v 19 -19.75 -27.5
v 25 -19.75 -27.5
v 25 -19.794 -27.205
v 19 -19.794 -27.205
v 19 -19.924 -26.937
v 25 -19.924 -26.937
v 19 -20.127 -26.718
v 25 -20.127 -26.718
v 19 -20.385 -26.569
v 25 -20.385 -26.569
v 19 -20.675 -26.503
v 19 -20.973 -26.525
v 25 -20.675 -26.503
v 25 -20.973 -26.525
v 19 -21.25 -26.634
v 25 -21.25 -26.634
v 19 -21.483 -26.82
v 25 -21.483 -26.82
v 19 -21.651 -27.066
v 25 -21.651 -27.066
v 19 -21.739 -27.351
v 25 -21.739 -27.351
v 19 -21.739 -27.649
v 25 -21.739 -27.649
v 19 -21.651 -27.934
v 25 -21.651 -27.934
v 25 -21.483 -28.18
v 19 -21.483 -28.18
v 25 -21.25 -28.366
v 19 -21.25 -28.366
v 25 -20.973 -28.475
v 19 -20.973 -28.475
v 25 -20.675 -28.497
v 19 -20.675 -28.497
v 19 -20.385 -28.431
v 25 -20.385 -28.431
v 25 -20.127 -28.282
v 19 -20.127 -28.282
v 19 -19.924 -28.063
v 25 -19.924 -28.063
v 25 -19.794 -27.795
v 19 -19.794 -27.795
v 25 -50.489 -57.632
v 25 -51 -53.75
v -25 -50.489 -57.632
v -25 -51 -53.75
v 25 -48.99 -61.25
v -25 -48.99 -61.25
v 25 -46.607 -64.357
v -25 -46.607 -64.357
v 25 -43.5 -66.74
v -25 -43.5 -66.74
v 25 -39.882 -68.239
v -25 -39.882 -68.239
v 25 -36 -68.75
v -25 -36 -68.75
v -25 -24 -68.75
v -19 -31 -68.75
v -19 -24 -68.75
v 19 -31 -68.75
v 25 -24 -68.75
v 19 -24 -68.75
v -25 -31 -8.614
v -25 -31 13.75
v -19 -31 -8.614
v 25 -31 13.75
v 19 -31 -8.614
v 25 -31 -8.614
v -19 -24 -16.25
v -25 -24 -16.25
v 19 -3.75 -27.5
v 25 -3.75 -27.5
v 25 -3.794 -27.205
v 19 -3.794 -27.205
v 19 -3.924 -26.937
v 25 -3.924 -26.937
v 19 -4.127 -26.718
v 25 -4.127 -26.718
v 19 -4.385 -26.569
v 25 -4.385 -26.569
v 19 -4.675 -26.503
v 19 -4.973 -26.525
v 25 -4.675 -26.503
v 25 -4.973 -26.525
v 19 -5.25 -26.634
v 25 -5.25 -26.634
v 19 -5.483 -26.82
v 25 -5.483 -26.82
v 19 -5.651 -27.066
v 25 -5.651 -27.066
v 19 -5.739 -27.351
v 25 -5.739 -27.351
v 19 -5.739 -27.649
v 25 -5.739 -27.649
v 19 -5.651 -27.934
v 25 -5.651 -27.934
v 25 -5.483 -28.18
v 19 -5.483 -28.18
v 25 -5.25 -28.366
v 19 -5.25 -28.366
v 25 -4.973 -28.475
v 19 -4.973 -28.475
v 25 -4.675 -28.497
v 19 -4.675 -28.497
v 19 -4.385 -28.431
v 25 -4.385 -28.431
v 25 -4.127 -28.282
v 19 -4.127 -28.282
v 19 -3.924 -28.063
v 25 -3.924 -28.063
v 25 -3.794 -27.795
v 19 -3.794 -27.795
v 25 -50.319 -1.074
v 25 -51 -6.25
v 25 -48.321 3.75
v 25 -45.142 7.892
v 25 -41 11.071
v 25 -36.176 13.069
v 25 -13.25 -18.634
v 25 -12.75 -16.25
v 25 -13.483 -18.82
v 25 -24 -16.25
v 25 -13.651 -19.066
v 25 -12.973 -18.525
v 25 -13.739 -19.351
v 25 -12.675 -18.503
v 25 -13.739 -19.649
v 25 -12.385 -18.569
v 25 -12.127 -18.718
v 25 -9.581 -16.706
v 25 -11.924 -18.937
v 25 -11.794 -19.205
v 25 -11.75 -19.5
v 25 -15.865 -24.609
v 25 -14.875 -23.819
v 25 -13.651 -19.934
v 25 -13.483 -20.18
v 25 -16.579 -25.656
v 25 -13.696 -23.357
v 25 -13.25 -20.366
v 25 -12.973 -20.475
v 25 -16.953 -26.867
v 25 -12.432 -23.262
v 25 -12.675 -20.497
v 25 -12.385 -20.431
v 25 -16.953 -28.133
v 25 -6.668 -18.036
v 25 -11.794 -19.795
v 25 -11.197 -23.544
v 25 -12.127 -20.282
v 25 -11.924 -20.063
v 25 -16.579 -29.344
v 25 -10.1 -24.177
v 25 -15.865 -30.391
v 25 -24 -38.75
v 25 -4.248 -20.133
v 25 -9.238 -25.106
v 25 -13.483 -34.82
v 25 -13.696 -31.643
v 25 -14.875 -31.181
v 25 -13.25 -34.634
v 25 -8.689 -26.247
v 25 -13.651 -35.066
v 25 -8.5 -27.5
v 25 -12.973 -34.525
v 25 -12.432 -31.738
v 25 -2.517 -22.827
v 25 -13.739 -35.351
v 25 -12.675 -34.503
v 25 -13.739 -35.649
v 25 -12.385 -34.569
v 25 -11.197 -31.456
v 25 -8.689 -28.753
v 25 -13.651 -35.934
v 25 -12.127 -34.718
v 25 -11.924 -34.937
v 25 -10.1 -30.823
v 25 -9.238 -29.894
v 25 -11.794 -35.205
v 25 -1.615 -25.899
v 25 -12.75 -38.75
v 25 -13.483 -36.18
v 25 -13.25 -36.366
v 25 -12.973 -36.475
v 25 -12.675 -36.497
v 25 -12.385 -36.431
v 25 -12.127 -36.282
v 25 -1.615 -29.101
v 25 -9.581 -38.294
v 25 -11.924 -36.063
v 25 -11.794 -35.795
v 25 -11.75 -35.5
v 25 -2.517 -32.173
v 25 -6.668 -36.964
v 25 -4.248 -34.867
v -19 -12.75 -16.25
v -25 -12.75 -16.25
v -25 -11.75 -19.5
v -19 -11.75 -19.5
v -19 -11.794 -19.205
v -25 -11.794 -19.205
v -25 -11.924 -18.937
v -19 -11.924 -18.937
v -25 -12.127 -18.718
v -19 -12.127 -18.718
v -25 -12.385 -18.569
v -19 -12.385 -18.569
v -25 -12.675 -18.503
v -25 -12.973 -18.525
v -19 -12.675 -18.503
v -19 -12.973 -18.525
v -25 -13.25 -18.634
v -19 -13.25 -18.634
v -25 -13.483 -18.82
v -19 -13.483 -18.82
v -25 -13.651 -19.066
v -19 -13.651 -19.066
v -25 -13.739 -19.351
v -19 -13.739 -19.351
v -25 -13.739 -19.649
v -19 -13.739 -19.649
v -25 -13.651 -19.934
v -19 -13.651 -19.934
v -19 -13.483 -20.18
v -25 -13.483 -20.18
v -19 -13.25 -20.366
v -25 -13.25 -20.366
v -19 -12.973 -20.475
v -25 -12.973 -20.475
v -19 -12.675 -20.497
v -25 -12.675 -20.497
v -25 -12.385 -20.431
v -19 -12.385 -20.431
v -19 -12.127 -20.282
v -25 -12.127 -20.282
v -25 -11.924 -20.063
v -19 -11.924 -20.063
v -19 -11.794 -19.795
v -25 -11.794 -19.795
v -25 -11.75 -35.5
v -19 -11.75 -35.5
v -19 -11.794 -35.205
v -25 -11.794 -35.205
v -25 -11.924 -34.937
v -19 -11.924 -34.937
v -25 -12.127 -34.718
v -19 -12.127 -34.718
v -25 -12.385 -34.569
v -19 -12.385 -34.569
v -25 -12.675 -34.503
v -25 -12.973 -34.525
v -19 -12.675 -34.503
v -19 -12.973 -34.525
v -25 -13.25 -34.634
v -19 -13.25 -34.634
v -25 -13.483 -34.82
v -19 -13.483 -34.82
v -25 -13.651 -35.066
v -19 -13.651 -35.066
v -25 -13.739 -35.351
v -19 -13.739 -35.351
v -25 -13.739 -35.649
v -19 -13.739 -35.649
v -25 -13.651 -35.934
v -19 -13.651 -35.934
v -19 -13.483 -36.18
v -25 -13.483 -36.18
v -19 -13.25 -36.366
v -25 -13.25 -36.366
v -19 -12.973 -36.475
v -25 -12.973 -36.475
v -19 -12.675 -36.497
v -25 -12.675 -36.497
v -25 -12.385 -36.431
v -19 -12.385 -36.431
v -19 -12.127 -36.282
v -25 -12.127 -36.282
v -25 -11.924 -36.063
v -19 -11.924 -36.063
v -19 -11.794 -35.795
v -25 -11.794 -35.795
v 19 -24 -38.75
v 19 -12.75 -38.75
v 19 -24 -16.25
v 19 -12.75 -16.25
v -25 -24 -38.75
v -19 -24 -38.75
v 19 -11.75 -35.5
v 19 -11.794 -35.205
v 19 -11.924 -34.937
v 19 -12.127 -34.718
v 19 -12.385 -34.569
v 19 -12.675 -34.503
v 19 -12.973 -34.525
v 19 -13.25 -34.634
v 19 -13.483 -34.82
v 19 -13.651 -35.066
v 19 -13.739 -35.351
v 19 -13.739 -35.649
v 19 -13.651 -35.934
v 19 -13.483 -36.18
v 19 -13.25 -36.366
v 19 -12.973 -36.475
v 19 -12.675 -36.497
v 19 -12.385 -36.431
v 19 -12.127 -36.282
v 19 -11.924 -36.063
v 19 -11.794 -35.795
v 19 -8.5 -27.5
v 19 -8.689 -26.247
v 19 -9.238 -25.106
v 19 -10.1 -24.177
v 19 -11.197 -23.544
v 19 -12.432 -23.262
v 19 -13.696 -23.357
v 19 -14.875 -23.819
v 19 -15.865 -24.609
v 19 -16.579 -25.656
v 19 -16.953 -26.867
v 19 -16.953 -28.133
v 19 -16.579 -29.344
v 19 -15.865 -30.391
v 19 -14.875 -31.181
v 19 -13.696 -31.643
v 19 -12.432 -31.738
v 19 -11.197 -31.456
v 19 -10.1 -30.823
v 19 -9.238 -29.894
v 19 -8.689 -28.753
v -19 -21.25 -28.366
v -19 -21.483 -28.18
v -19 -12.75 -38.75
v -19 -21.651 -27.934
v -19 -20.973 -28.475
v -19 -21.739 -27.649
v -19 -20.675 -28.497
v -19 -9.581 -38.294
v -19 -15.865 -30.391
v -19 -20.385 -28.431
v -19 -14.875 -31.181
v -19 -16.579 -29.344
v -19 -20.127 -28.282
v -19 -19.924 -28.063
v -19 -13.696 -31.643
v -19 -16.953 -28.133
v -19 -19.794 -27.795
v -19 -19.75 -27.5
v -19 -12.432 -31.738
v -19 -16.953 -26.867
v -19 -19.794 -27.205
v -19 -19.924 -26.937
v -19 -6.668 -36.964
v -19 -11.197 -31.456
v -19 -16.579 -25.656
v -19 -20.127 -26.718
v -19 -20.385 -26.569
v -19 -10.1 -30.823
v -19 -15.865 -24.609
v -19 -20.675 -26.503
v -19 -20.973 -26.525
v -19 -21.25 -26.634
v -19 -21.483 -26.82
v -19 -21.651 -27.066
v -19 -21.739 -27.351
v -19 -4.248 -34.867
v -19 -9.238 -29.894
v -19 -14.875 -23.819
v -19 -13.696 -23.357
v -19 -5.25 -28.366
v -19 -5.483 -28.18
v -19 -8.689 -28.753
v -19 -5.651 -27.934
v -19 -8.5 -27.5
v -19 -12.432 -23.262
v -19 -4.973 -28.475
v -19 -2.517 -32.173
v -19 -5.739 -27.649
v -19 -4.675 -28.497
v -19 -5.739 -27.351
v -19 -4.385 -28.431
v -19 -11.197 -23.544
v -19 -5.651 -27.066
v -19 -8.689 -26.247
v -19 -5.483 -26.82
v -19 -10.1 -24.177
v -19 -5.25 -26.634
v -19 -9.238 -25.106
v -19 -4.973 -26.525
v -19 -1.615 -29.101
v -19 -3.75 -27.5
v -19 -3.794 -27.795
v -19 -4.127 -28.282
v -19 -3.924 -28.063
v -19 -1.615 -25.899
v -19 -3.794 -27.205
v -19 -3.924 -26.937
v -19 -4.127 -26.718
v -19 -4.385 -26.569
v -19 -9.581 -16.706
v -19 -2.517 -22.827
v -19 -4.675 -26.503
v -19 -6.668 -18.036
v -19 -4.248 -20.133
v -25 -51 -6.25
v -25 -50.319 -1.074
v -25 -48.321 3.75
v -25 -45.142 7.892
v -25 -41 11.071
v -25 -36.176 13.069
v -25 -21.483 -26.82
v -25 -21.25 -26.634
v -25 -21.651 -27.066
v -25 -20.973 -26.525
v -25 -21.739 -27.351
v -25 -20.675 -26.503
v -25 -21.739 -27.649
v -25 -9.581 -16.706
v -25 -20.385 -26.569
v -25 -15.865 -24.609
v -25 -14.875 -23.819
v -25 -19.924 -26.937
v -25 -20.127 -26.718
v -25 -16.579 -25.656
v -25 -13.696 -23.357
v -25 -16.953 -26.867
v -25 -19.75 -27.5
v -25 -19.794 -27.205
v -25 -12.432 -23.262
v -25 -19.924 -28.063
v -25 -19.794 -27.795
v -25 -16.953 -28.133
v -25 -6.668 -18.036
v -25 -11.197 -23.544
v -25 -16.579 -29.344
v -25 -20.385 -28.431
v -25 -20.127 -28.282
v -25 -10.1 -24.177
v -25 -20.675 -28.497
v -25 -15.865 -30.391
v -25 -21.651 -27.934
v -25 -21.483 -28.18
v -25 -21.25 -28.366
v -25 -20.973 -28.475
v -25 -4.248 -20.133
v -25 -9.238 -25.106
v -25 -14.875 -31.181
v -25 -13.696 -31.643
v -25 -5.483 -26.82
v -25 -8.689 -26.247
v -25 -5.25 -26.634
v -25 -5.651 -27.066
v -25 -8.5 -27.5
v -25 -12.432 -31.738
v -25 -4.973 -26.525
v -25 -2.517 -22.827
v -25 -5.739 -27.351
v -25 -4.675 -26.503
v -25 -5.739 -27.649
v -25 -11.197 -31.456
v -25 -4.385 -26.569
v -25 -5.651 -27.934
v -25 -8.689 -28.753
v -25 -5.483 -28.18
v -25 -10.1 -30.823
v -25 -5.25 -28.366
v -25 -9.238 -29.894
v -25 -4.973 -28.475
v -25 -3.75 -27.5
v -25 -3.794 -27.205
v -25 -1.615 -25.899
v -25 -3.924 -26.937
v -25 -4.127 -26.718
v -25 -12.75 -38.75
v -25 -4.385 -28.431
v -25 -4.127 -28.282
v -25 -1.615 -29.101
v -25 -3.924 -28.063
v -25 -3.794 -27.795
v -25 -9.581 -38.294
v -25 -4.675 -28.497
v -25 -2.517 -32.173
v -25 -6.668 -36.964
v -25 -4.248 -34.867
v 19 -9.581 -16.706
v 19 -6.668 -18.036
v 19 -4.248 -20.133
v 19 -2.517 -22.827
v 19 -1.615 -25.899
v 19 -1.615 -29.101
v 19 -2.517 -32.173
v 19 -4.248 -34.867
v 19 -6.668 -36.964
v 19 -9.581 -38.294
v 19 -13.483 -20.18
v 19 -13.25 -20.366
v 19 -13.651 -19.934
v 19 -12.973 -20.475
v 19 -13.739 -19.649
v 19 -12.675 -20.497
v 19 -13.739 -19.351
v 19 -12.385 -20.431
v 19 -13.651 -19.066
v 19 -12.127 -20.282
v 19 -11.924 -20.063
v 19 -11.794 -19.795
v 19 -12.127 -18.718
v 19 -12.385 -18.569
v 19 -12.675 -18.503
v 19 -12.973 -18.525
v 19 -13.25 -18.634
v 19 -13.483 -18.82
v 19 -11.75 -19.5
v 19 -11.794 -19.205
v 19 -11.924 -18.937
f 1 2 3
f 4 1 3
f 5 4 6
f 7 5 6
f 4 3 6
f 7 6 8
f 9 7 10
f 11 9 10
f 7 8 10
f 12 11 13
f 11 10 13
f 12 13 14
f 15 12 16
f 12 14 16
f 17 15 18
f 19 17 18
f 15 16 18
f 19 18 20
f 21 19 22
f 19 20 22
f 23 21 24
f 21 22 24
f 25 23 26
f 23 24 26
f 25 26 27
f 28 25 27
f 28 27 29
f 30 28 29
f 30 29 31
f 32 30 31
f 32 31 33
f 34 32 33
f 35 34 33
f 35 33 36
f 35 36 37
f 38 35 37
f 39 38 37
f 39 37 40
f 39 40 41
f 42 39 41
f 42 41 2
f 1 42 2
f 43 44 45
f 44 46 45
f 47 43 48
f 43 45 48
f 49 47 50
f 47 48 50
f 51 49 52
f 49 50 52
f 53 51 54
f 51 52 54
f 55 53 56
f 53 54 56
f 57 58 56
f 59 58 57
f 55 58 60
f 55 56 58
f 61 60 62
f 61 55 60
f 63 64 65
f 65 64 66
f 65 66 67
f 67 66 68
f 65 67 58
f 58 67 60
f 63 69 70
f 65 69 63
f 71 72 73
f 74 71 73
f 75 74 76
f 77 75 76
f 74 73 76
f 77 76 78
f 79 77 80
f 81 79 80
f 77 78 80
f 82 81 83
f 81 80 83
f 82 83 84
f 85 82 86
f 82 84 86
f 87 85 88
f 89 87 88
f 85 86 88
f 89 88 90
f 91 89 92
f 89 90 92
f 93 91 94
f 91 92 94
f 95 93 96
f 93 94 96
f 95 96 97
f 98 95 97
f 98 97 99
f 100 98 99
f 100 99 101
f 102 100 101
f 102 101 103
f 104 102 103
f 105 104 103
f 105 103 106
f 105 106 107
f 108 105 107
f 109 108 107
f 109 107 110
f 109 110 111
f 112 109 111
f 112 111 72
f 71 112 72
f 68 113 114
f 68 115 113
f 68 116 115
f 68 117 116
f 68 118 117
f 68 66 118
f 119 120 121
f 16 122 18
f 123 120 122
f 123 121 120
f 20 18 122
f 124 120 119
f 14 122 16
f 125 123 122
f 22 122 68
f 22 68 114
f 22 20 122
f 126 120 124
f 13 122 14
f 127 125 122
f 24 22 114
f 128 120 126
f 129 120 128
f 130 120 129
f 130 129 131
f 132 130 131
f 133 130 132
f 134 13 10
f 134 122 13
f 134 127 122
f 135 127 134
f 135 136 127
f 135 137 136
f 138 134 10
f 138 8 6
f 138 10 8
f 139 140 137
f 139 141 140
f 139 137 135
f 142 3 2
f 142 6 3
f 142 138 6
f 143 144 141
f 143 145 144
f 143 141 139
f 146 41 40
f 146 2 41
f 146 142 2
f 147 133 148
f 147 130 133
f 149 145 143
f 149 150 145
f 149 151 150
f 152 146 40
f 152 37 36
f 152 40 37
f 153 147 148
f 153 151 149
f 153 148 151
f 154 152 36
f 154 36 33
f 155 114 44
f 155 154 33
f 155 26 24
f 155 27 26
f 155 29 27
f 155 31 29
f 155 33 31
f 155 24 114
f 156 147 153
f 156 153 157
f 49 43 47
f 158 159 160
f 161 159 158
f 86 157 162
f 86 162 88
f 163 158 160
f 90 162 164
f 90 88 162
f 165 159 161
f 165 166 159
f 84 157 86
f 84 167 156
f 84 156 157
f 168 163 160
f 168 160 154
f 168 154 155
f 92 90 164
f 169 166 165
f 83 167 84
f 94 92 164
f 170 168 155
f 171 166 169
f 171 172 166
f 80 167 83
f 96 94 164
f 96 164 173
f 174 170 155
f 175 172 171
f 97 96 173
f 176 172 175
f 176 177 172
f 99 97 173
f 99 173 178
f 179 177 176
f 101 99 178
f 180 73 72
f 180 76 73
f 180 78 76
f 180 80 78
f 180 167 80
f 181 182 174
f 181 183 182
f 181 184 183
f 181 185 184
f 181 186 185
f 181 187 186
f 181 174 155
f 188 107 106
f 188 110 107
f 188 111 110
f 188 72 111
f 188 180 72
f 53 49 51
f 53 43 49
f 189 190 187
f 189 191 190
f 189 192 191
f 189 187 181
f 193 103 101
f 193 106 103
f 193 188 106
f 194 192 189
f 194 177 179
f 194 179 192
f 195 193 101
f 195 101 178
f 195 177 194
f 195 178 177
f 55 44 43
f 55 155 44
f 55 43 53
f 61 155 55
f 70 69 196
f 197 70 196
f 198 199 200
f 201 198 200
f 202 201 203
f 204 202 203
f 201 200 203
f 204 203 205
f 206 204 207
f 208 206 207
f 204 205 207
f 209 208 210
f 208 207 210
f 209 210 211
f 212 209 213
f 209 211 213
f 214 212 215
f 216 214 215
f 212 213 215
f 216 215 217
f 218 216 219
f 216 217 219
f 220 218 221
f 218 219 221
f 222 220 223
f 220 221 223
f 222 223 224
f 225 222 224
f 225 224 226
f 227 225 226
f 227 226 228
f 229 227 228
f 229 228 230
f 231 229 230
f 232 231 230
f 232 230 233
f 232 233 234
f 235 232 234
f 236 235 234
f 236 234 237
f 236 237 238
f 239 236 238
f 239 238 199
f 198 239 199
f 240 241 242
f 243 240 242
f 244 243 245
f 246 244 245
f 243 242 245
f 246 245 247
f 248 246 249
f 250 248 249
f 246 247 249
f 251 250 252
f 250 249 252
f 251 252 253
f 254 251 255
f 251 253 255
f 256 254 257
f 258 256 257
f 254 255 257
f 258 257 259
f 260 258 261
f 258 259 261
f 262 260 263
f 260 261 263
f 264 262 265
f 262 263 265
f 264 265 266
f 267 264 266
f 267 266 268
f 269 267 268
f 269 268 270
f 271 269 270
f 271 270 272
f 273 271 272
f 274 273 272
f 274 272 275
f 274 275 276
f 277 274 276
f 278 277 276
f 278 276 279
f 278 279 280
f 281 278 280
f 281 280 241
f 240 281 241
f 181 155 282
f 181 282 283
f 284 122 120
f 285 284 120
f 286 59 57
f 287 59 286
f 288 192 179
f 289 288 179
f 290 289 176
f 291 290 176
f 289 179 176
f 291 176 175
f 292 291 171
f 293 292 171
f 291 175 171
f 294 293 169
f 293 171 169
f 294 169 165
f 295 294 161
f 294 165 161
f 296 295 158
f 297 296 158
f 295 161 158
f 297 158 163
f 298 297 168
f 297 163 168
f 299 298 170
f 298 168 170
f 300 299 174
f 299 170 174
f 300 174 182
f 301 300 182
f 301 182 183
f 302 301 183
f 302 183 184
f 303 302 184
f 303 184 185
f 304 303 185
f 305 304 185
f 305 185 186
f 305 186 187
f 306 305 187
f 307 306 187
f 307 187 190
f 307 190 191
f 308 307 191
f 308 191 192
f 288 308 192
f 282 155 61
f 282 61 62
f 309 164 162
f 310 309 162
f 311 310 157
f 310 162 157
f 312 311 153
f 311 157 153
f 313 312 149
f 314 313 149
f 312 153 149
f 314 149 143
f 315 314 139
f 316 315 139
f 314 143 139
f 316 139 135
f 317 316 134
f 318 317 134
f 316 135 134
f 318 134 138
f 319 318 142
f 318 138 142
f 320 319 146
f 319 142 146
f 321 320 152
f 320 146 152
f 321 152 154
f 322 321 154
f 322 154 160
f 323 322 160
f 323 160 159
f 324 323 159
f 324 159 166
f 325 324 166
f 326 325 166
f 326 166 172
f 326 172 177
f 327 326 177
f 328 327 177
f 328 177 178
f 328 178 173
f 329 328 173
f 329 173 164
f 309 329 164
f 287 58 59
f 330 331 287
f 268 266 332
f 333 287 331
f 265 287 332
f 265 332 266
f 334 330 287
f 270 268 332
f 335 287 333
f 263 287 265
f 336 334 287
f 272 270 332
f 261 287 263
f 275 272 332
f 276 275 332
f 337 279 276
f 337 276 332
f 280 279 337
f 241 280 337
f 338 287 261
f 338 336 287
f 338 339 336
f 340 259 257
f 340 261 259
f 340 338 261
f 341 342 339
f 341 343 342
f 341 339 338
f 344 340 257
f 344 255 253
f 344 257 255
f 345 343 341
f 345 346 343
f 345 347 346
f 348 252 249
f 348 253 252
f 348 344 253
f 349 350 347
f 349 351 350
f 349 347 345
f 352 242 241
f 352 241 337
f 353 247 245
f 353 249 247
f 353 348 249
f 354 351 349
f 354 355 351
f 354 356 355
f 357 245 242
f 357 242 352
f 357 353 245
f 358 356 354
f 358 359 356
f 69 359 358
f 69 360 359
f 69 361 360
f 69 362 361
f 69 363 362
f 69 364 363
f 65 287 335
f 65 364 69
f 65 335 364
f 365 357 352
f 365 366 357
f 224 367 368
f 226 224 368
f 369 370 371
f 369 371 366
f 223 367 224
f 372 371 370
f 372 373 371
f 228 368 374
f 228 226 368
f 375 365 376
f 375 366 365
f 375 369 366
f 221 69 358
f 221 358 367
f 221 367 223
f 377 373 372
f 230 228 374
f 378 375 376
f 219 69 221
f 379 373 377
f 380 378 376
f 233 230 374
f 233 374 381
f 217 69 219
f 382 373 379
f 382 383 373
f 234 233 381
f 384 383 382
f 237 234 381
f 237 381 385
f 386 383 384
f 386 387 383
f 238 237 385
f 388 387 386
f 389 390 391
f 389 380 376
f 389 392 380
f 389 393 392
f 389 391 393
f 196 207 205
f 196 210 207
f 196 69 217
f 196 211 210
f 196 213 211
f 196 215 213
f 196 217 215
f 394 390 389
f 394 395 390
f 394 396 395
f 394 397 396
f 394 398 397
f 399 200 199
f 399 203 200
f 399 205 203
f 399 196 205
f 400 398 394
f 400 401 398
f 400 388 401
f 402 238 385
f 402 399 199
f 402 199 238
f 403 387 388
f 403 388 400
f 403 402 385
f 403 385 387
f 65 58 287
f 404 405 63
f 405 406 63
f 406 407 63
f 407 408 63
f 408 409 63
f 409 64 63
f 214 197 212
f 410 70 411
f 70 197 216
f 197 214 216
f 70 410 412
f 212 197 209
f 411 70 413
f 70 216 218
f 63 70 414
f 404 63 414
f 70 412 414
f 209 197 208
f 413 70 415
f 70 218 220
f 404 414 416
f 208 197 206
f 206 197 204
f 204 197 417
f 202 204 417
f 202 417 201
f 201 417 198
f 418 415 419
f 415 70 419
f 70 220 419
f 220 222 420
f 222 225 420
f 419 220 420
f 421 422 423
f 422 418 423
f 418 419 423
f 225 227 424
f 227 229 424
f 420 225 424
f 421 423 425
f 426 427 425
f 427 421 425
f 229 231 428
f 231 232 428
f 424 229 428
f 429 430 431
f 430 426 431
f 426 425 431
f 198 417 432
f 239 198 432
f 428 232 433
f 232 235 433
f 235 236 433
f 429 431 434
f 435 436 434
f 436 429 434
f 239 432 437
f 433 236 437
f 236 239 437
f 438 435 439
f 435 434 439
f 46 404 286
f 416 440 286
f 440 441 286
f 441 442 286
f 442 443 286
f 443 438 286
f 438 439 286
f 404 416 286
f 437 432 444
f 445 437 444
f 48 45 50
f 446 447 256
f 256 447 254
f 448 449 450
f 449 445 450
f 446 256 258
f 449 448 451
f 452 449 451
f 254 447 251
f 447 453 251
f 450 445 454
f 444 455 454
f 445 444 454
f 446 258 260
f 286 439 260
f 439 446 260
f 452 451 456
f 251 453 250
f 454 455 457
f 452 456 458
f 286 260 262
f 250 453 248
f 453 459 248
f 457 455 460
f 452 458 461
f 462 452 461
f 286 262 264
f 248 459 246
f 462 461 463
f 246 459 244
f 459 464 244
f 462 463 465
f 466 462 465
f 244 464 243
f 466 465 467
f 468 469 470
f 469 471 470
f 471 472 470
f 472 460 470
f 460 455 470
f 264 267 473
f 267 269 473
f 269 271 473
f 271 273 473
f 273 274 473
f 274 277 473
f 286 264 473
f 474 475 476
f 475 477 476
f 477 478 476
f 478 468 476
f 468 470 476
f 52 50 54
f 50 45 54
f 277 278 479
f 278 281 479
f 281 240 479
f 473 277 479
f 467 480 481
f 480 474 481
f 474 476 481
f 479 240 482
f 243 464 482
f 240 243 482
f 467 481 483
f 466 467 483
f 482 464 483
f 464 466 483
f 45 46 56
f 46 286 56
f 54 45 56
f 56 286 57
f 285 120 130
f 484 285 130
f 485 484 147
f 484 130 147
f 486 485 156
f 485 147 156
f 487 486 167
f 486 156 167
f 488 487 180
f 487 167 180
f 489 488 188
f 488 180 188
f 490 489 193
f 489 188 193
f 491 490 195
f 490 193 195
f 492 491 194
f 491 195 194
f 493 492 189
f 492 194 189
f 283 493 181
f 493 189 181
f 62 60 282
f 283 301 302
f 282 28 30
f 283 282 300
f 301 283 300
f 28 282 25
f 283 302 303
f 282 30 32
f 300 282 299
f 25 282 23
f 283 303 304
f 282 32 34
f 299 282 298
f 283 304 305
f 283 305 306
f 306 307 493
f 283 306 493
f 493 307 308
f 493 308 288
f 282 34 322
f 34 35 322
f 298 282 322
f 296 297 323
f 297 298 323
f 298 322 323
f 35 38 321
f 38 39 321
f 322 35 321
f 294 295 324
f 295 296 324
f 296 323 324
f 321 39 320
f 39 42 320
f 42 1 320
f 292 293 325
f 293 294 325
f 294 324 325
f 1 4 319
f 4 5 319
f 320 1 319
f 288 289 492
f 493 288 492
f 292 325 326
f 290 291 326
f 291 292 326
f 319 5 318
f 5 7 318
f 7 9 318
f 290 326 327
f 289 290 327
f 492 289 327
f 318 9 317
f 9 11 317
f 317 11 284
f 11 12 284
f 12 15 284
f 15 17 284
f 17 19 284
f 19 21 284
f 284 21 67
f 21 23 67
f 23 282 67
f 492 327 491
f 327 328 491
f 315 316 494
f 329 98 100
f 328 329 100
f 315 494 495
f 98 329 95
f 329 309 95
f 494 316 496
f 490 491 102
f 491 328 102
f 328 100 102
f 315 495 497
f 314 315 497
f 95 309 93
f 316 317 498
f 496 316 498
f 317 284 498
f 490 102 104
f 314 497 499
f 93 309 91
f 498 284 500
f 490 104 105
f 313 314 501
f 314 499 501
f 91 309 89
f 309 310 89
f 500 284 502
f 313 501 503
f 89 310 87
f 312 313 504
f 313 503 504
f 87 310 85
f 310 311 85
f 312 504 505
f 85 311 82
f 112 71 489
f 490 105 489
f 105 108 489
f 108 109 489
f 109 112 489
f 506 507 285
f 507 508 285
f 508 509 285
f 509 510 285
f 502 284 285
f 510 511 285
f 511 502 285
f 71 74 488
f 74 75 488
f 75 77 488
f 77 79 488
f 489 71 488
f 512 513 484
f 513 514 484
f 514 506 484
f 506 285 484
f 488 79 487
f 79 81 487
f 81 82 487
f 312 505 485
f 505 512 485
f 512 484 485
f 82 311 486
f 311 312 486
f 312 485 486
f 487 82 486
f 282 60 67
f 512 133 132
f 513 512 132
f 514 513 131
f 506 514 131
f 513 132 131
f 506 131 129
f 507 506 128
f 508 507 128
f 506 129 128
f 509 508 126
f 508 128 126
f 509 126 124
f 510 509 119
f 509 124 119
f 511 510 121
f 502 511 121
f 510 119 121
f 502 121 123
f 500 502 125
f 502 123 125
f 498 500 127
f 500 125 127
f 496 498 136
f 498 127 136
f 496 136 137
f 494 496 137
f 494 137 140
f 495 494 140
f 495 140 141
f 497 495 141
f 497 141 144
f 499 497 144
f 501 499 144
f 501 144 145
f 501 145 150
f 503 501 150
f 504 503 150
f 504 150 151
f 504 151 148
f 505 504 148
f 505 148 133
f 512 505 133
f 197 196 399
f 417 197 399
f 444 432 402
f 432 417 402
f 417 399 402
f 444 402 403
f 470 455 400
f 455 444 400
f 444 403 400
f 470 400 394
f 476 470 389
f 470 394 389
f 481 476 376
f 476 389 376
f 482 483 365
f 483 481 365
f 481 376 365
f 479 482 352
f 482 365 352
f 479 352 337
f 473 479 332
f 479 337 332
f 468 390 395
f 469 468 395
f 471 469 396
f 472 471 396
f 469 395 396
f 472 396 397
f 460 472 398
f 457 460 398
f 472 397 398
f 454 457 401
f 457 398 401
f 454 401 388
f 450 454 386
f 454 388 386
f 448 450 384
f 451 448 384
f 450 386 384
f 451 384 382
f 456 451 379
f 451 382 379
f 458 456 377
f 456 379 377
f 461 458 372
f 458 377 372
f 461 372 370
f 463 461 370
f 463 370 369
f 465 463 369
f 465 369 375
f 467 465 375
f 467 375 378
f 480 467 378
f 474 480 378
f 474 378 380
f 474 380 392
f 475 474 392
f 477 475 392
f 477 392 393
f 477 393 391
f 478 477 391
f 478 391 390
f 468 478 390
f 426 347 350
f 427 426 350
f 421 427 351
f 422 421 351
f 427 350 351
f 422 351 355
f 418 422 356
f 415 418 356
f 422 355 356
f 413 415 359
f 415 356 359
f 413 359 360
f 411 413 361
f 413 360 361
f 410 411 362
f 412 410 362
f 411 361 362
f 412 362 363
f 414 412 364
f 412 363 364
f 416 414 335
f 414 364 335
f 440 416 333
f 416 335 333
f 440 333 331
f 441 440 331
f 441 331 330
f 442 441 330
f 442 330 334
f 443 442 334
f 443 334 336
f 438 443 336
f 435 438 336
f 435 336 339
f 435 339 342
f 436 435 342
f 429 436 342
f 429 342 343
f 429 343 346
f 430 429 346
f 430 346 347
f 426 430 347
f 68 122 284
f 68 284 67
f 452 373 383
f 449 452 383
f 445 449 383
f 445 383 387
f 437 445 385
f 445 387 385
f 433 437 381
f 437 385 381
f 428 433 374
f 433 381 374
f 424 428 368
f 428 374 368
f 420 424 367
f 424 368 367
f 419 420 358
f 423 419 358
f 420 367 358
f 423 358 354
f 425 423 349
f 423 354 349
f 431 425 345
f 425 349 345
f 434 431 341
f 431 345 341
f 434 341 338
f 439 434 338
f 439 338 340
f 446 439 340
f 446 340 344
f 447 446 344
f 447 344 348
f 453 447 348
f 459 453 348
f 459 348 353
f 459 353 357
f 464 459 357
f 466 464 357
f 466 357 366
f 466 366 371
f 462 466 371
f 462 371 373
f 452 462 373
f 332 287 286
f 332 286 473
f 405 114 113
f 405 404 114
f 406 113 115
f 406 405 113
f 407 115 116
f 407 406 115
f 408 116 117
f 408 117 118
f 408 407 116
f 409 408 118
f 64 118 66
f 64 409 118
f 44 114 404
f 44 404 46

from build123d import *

# Parameters (mm, degrees)
SKETCH1_W            = 50
SKETCH1_H            = 170
BOSS_EXTRUDE1_DEPTH  = 55
SKETCH2_W            = 34
SKETCH2_H            = 27
CUT_EXTRUDE1_DEPTH   = 181.416185527
SKETCH3_W            = 10
SKETCH3_H            = 24
SKETCH3_R            = 4.25
SKETCH3_R_2          = 1
CUT_EXTRUDE2_DEPTH   = 186.539753153
SKETCH4_W            = 2
SKETCH4_H            = 24
CUT_EXTRUDE3_DEPTH   = 178.623196683
SKETCH5_W            = 6.25
SKETCH5_H            = 11.25
CUT_EXTRUDE4_DEPTH   = 186.539753153
SKETCH6_W            = 38
SKETCH6_H            = 10
CUT_EXTRUDE5_DEPTH   = 181.416185527
SKETCH8_W            = 13.25
SKETCH8_H            = 2.25
CUT_EXTRUDE7_DEPTH   = 186.539753153
SKETCH9_W            = 34
SKETCH9_H            = 35.25
CUT_EXTRUDE8_DEPTH   = 179.297679458
SKETCH11_W           = 13.25
SKETCH11_H           = 20.25
CUT_EXTRUDE9_DEPTH   = 184.480414486
SKETCH12_W           = 28.5
SKETCH12_H           = 15
BOSS_EXTRUDE2_DEPTH  = 8
SKETCH14_W           = 34
SKETCH14_H           = 15
SKETCH14_H_2         = 10.25
BOSS_EXTRUDE3_DEPTH  = 13.25
SKETCH16_R           = 4.5
SKETCH16_R_2         = 2.5
CUT_EXTRUDE13_DEPTH  = 8
SKETCH17_R           = 4.5
SKETCH17_W           = 55
SKETCH17_H           = 10.25
CUT_EXTRUDE15_DEPTH  = 175.384811552
SKETCH18_W           = 71.25
SKETCH18_H           = 27.5
SKETCH18_W_2         = 13.75
SKETCH18_W_3         = 16.25
BOSS_EXTRUDE4_DEPTH  = 50
SKETCH19_W           = 38
SKETCH19_H           = 7
CUT_EXTRUDE16_DEPTH  = 152.25227271
SKETCH20_W           = 57.5
SKETCH20_H           = 27.5
CUT_EXTRUDE17_DEPTH  = 102.137591923
CUT_EXTRUDE18_DEPTH  = 100.39221549
SKETCH22_W           = 82.5
SKETCH22_H           = 2.5
BOSS_EXTRUDE5_DEPTH  = 50
SKETCH24_W           = 22
SKETCH24_H           = 17
CUT_EXTRUDE19_DEPTH  = 101.710289941
SKETCH25_W           = 38
SKETCH25_H           = 38.136363636
CUT_EXTRUDE20_DEPTH  = 10
SKETCH26_W           = 82.5
SKETCH26_H           = 2.5
CUT_EXTRUDE21_DEPTH  = 101.710289941
SKETCH27_W           = 38
SKETCH27_H           = 5
BOSS_EXTRUDE6_DEPTH  = 60.14
SKETCH29_W           = 38
SKETCH29_H           = 5
BOSS_EXTRUDE8_DEPTH  = 60.14
SKETCH30_W           = 6
SKETCH30_H           = 17
BOSS_EXTRUDE9_DEPTH  = 22.14
SKETCH31_W           = 22.363636364
SKETCH31_H           = 20.5
BOSS_EXTRUDE10_DEPTH = 50
SKETCH32_W           = 82.5
SKETCH32_H           = 0.5
SKETCH32_W_2         = 0.14
SKETCH32_H_2         = 17
CUT_EXTRUDE22_DEPTH  = 100.489105434
FILLET1_R            = 15
FILLET2_R            = 20


with BuildPart() as part:
    # Sketch1 → Boss-Extrude1 (new body)
    with BuildSketch(Plane.XY):
        with Locations((0, -85)):
            Rectangle(SKETCH1_W, SKETCH1_H)
    extrude(amount=-BOSS_EXTRUDE1_DEPTH)

    # Sketch2 → Cut-Extrude1 (cut, through all)
    with BuildSketch(Plane.XY):
        with Locations((0, -13.5)):
            Rectangle(SKETCH2_W, SKETCH2_H)
    extrude(amount=-CUT_EXTRUDE1_DEPTH, mode=Mode.SUBTRACT)

    # Sketch3 → Cut-Extrude2 (cut, through all)
    with BuildSketch(Plane(origin=(25, 0, 0), x_dir=(0, 0, -1), z_dir=(1, 0, 0))):
        with Locations((50, -12)):
            Rectangle(SKETCH3_W, SKETCH3_H)
        with Locations((5, -12)):
            Rectangle(SKETCH3_W, SKETCH3_H)
        with Locations(Location((27.5, -12.75, 0), (0, 0, 90))):
            Circle(SKETCH3_R)
        with Locations(Location((35.5, -12.75, 0), (0, 0, 90))):
            Circle(SKETCH3_R_2)
        with Locations(Location((27.5, -4.75, 0), (0, 0, 90))):
            Circle(SKETCH3_R_2)
        with Locations(Location((27.5, -20.75, 0), (0, 0, 90))):
            Circle(SKETCH3_R_2)
        with Locations(Location((19.5, -12.75, 0), (0, 0, 90))):
            Circle(SKETCH3_R_2)
    extrude(amount=-CUT_EXTRUDE2_DEPTH, mode=Mode.SUBTRACT)

    # Sketch4 → Cut-Extrude3 (cut, through all)
    with BuildSketch(Plane.XY.offset(-10)):
        with Locations((-18, -12)):
            Rectangle(SKETCH4_W, SKETCH4_H)
        with Locations((18, -12)):
            Rectangle(SKETCH4_W, SKETCH4_H)
    extrude(amount=-CUT_EXTRUDE3_DEPTH, mode=Mode.SUBTRACT)

    # Sketch5 → Cut-Extrude4 (cut, through all)
    with BuildSketch(Plane(origin=(25, 0, 0), x_dir=(0, 0, -1), z_dir=(1, 0, 0))):
        with BuildLine():
            Line((45, 0), (10, 0))
            Line((10, 0), (10, -12.75))
            Line((10, -12.75), (16.25, -12.75))
            ThreePointArc((16.25, -12.75), (27.5, -1.5), (38.75, -12.75))
            Line((38.75, -12.75), (45, -12.75))
            Line((45, -12.75), (45, 0))
        make_face()
        with Locations((13.125, -18.375)):
            Rectangle(SKETCH5_W, SKETCH5_H)
        with Locations((41.875, -18.375)):
            Rectangle(SKETCH5_W, SKETCH5_H)
    extrude(amount=-CUT_EXTRUDE4_DEPTH, mode=Mode.SUBTRACT)

    # Sketch6 → Cut-Extrude5 (cut, through all)
    with BuildSketch(Plane.XY):
        with Locations((0, -29)):
            Rectangle(SKETCH6_W, SKETCH6_H)
    extrude(amount=-CUT_EXTRUDE5_DEPTH, mode=Mode.SUBTRACT)

    # Sketch8 → Cut-Extrude7 (cut, through all)
    with BuildSketch(Plane(origin=(25, 0, 0), x_dir=(0, 0, -1), z_dir=(1, 0, 0))):
        with BuildLine():
            Line((27.5, -157.5), (27.5, -132.5))
            Line((27.5, -132.5), (13.25, -132.5))
            Line((13.25, -132.5), (13.25, -167.75))
            Line((13.25, -167.75), (17.25, -167.75))
            ThreePointArc((17.25, -167.75), (20.252155493, -160.502155493), (27.5, -157.5))
        make_face()
        with BuildLine():
            Line((41.75, -167.75), (41.75, -132.5))
            Line((41.75, -132.5), (27.5, -132.5))
            Line((27.5, -132.5), (27.5, -157.5))
            ThreePointArc((27.5, -157.5), (34.747844507, -160.502155493), (37.75, -167.75))
            Line((37.75, -167.75), (41.75, -167.75))
        make_face()
        with Locations((48.375, -168.875)):
            Rectangle(SKETCH8_W, SKETCH8_H)
        with Locations((6.625, -168.875)):
            Rectangle(SKETCH8_W, SKETCH8_H)
        with BuildLine():
            Line((17.25, -167.75), (13.25, -167.75))
            Line((13.25, -167.75), (13.25, -170))
            Line((13.25, -170), (17.5, -170))
            ThreePointArc((17.5, -170), (17.31269172, -168.881923142), (17.25, -167.75))
        make_face()
        with BuildLine():
            Line((41.75, -170), (41.75, -167.75))
            Line((41.75, -167.75), (37.75, -167.75))
            ThreePointArc((37.75, -167.75), (37.68730828, -168.881923142), (37.5, -170))
            Line((37.5, -170), (41.75, -170))
        make_face()
        with BuildLine():
            Line((27.5, -167.75), (27.5, -157.5))
            ThreePointArc((27.5, -157.5), (20.252155493, -160.502155493), (17.25, -167.75))
            Line((17.25, -167.75), (27.5, -167.75))
        make_face()
        with BuildLine():
            ThreePointArc((37.75, -167.75), (34.747844507, -160.502155493), (27.5, -157.5))
            Line((27.5, -157.5), (27.5, -167.75))
            Line((27.5, -167.75), (37.75, -167.75))
        make_face()
        with BuildLine():
            Line((27.5, -170), (27.5, -167.75))
            Line((27.5, -167.75), (17.25, -167.75))
            ThreePointArc((17.25, -167.75), (17.31269172, -168.881923142), (17.5, -170))
            Line((17.5, -170), (27.5, -170))
        make_face()
        with BuildLine():
            ThreePointArc((37.5, -170), (37.68730828, -168.881923142), (37.75, -167.75))
            Line((37.75, -167.75), (27.5, -167.75))
            Line((27.5, -167.75), (27.5, -170))
            Line((27.5, -170), (37.5, -170))
        make_face()
    extrude(amount=-CUT_EXTRUDE7_DEPTH, mode=Mode.SUBTRACT)

    # Sketch9 → Cut-Extrude8 (cut, through all)
    with BuildSketch(Plane.XY):
        with Locations((0, -150.125)):
            Rectangle(SKETCH9_W, SKETCH9_H)
    extrude(amount=-CUT_EXTRUDE8_DEPTH, mode=Mode.SUBTRACT)

    # Sketch11 → Cut-Extrude9 (cut, through all)
    with BuildSketch(Plane(origin=(25, 0, 0), x_dir=(0, 0, -1), z_dir=(1, 0, 0))):
        with BuildLine():
            ThreePointArc((17.25, -167.75), (20.252155493, -160.502155493), (27.5, -157.5))
            Line((27.5, -157.5), (27.5, -147.5))
            Line((27.5, -147.5), (13.25, -147.5))
            Line((13.25, -147.5), (13.25, -167.75))
            Line((13.25, -167.75), (17.25, -167.75))
        make_face()
        with BuildLine():
            Line((27.5, -147.5), (27.5, -157.5))
            ThreePointArc((27.5, -157.5), (34.747844507, -160.502155493), (37.75, -167.75))
            Line((37.75, -167.75), (41.75, -167.75))
            Line((41.75, -167.75), (41.75, -147.5))
            Line((41.75, -147.5), (27.5, -147.5))
        make_face()
        with Locations((48.375, -157.625)):
            Rectangle(SKETCH11_W, SKETCH11_H)
        with Locations((6.625, -157.625)):
            Rectangle(SKETCH11_W, SKETCH11_H)
    extrude(amount=-CUT_EXTRUDE9_DEPTH, mode=Mode.SUBTRACT)

    # Sketch12 → Boss-Extrude2 (add)
    with BuildSketch(Plane(origin=(25, 0, 0), x_dir=(0, 0, -1), z_dir=(1, 0, 0))):
        with Locations((27.5, -140)):
            Rectangle(SKETCH12_W, SKETCH12_H)
    boss_extrude2 = extrude(amount=-BOSS_EXTRUDE2_DEPTH)

    # Mirror1: Boss-Extrude2 across plane
    add(boss_extrude2.mirror(Plane(origin=(0, 0, 0), x_dir=(0, 0, 1), z_dir=(1, 0, 0))))

    # Sketch14 → Boss-Extrude3 (add)
    with BuildSketch(Plane.XY):
        with Locations((0, -140)):
            Rectangle(SKETCH14_W, SKETCH14_H)
        with Locations((0, -152.625)):
            Rectangle(SKETCH14_W, SKETCH14_H_2)
    boss_extrude3 = extrude(amount=-BOSS_EXTRUDE3_DEPTH)

    # Mirror2: Boss-Extrude3 across plane
    add(boss_extrude3.mirror(Plane.XY.offset(-27.5)))

    # Sketch16 → Cut-Extrude13 (cut)
    # profile 1 of 3: a face of its own
    with BuildSketch(Plane(origin=(25, 0, 0), x_dir=(0, 0, -1), z_dir=(1, 0, 0))):
        with Locations(Location((16.5, -135.75, 0), (0, 0, 90))):
            Circle(SKETCH16_R)
        with Locations((16.5, -135.75)):
            Circle(SKETCH16_R_2, mode=Mode.SUBTRACT)
    # profile 2 of 3: a face of its own
    with BuildSketch(Plane(origin=(25, 0, 0), x_dir=(0, 0, -1), z_dir=(1, 0, 0))):
        with Locations((16.5, -135.75)):
            Circle(SKETCH16_R_2)
    # profile 3 of 3: a face of its own
    with BuildSketch(Plane(origin=(25, 0, 0), x_dir=(0, 0, -1), z_dir=(1, 0, 0))):
        with Locations(Location((38.5, -135.75, 0), (0, 0, 90))):
            Circle(SKETCH16_R)
    cut_extrude13 = extrude(amount=-CUT_EXTRUDE13_DEPTH, mode=Mode.SUBTRACT)

    # Mirror3: Cut-Extrude13 across plane
    add(cut_extrude13.mirror(Plane(origin=(0, 0, 0), x_dir=(0, 0, 1), z_dir=(1, 0, 0))), mode=Mode.SUBTRACT)

    # Sketch17 → Cut-Extrude15 (cut, through all)
    # profile 1 of 4: a face of its own
    with BuildSketch(Plane(origin=(25, 0, 0), x_dir=(0, 0, -1), z_dir=(1, 0, 0))):
        Polygon((55, -51.5), (27.5, -51.5), (0, -51.5), (0, -147.5), (55, -147.5), align=None)
        with Locations((16.5, -135.75)):
            Circle(SKETCH17_R, mode=Mode.SUBTRACT)
        with Locations((38.5, -135.75)):
            Circle(SKETCH17_R, mode=Mode.SUBTRACT)
    # profile 2 of 4: a face of its own
    with BuildSketch(Plane(origin=(25, 0, 0), x_dir=(0, 0, -1), z_dir=(1, 0, 0))):
        with Locations((27.5, -152.625)):
            Rectangle(SKETCH17_W, SKETCH17_H)
    # profile 3 of 4: a face of its own
    with BuildSketch(Plane(origin=(25, 0, 0), x_dir=(0, 0, -1), z_dir=(1, 0, 0))):
        with Locations((38.5, -135.75)):
            Circle(SKETCH17_R)
    # profile 4 of 4: a face of its own
    with BuildSketch(Plane(origin=(25, 0, 0), x_dir=(0, 0, -1), z_dir=(1, 0, 0))):
        with Locations((16.5, -135.75)):
            Circle(SKETCH17_R)
    extrude(amount=-CUT_EXTRUDE15_DEPTH, mode=Mode.SUBTRACT)

    # Sketch18 → Boss-Extrude4 (add)
    with BuildSketch(Plane(origin=(25, 0, 0), x_dir=(0, 0, -1), z_dir=(1, 0, 0))):
        with Locations((-35.625, -37.75)):
            Rectangle(SKETCH18_W, SKETCH18_H)
        with Locations((61.875, -37.75)):
            Rectangle(SKETCH18_W_2, SKETCH18_H)
        Polygon((38.75, -51.5), (38.75, -24), (16.25, -24), (0, -24), (0, -51.5), align=None)
        with Locations((46.875, -37.75)):
            Rectangle(SKETCH18_W_3, SKETCH18_H)
    extrude(amount=-BOSS_EXTRUDE4_DEPTH)

    # Sketch19 → Cut-Extrude16 (cut, through all)
    with BuildSketch(Plane.XY.offset(71.25)):
        with Locations((0, -27.5)):
            Rectangle(SKETCH19_W, SKETCH19_H)
    extrude(amount=-CUT_EXTRUDE16_DEPTH, mode=Mode.SUBTRACT)

    # Sketch20 → Cut-Extrude17 (cut, through all)
    with BuildSketch(Plane(origin=(25, 0, 0), x_dir=(0, 0, -1), z_dir=(1, 0, 0))):
        with Locations((-42.5, -37.75)):
            Rectangle(SKETCH20_W, SKETCH20_H)
    extrude(amount=-CUT_EXTRUDE17_DEPTH, mode=Mode.SUBTRACT)

    # Sketch21 → Cut-Extrude18 (cut, through all)
    with BuildSketch(Plane(origin=(25, 0, 0), x_dir=(0, 0, -1), z_dir=(1, 0, 0))):
        Polygon((16.25, -24), (-13.75, -51.5), (-13.75, -24), align=None)
    extrude(amount=-CUT_EXTRUDE18_DEPTH, mode=Mode.SUBTRACT)

    # Sketch22 → Boss-Extrude5 (add)
    with BuildSketch(Plane(origin=(25, 0, 0), x_dir=(0, 0, -1), z_dir=(1, 0, 0))):
        with Locations((27.5, -52.75)):
            Rectangle(SKETCH22_W, SKETCH22_H)
    extrude(amount=-BOSS_EXTRUDE5_DEPTH)

    # Sketch24 → Cut-Extrude19 (cut, through all)
    with BuildSketch(Plane(origin=(25, 0, 0), x_dir=(0, 0, -1), z_dir=(1, 0, 0))):
        with Locations((57.75, -32.5)):
            Rectangle(SKETCH24_W, SKETCH24_H)
    extrude(amount=-CUT_EXTRUDE19_DEPTH, mode=Mode.SUBTRACT)

    # Sketch25 → Cut-Extrude20 (cut)
    with BuildSketch(Plane(origin=(0, -31, 0), x_dir=(1, 0, 0), z_dir=(0, 1, 0))):
        with Locations((0, 27.681818182)):
            Rectangle(SKETCH25_W, SKETCH25_H)
    extrude(amount=-CUT_EXTRUDE20_DEPTH, mode=Mode.SUBTRACT)

    # Sketch26 → Cut-Extrude21 (cut, through all)
    with BuildSketch(Plane(origin=(25, 0, 0), x_dir=(0, 0, -1), z_dir=(1, 0, 0))):
        with Locations((27.5, -52.75)):
            Rectangle(SKETCH26_W, SKETCH26_H)
    extrude(amount=-CUT_EXTRUDE21_DEPTH, mode=Mode.SUBTRACT)

    # Sketch27 → Boss-Extrude6 (add)
    with BuildSketch(Plane(origin=(0, 0, -8.613636364), x_dir=(-1, 0, 0), z_dir=(0, 0, -1))):
        with Locations((0, -38.5)):
            Rectangle(SKETCH27_W, SKETCH27_H)
    extrude(amount=BOSS_EXTRUDE6_DEPTH)

    # Sketch29 → Boss-Extrude8 (add)
    with BuildSketch(Plane(origin=(0, 0, -8.613636364), x_dir=(-1, 0, 0), z_dir=(0, 0, -1))):
        with Locations((0, -33.5)):
            Rectangle(SKETCH29_W, SKETCH29_H)
    extrude(amount=BOSS_EXTRUDE8_DEPTH)

    # Sketch30 → Boss-Extrude9 (add)
    with BuildSketch(Plane(origin=(0, 0, -46.75), x_dir=(-1, 0, 0), z_dir=(0, 0, -1))):
        with Locations((-22, -32.5)):
            Rectangle(SKETCH30_W, SKETCH30_H)
        with Locations((22, -32.5)):
            Rectangle(SKETCH30_W, SKETCH30_H)
    extrude(amount=BOSS_EXTRUDE9_DEPTH)

    # Sketch31 → Boss-Extrude10 (add)
    with BuildSketch(Plane(origin=(25, 0, 0), x_dir=(0, 0, -1), z_dir=(1, 0, 0))):
        with Locations((-2.568181818, -41.25)):
            Rectangle(SKETCH31_W, SKETCH31_H)
    extrude(amount=-BOSS_EXTRUDE10_DEPTH)

    # Sketch32 → Cut-Extrude22 (cut, through all)
    with BuildSketch(Plane(origin=(25, 0, 0), x_dir=(0, 0, -1), z_dir=(1, 0, 0))):
        with Locations((27.5, -51.25)):
            Rectangle(SKETCH32_W, SKETCH32_H)
        with Locations((68.82, -32.5)):
            Rectangle(SKETCH32_W_2, SKETCH32_H_2)
    extrude(amount=-CUT_EXTRUDE22_DEPTH, mode=Mode.SUBTRACT)

    # Fillet1
    fillet1_edges = [part.edges().sort_by_distance(p)[0] for p in [
        (0, -51, -68.75),
    ]]
    fillet(fillet1_edges, radius=FILLET1_R)

    # Fillet2
    fillet2_edges = [part.edges().sort_by_distance(p)[0] for p in [
        (0, -51, 13.75),
    ]]
    fillet(fillet2_edges, radius=FILLET2_R - 0.0001)  # a hair under: the kernel refuses the full size


solid = part.part
